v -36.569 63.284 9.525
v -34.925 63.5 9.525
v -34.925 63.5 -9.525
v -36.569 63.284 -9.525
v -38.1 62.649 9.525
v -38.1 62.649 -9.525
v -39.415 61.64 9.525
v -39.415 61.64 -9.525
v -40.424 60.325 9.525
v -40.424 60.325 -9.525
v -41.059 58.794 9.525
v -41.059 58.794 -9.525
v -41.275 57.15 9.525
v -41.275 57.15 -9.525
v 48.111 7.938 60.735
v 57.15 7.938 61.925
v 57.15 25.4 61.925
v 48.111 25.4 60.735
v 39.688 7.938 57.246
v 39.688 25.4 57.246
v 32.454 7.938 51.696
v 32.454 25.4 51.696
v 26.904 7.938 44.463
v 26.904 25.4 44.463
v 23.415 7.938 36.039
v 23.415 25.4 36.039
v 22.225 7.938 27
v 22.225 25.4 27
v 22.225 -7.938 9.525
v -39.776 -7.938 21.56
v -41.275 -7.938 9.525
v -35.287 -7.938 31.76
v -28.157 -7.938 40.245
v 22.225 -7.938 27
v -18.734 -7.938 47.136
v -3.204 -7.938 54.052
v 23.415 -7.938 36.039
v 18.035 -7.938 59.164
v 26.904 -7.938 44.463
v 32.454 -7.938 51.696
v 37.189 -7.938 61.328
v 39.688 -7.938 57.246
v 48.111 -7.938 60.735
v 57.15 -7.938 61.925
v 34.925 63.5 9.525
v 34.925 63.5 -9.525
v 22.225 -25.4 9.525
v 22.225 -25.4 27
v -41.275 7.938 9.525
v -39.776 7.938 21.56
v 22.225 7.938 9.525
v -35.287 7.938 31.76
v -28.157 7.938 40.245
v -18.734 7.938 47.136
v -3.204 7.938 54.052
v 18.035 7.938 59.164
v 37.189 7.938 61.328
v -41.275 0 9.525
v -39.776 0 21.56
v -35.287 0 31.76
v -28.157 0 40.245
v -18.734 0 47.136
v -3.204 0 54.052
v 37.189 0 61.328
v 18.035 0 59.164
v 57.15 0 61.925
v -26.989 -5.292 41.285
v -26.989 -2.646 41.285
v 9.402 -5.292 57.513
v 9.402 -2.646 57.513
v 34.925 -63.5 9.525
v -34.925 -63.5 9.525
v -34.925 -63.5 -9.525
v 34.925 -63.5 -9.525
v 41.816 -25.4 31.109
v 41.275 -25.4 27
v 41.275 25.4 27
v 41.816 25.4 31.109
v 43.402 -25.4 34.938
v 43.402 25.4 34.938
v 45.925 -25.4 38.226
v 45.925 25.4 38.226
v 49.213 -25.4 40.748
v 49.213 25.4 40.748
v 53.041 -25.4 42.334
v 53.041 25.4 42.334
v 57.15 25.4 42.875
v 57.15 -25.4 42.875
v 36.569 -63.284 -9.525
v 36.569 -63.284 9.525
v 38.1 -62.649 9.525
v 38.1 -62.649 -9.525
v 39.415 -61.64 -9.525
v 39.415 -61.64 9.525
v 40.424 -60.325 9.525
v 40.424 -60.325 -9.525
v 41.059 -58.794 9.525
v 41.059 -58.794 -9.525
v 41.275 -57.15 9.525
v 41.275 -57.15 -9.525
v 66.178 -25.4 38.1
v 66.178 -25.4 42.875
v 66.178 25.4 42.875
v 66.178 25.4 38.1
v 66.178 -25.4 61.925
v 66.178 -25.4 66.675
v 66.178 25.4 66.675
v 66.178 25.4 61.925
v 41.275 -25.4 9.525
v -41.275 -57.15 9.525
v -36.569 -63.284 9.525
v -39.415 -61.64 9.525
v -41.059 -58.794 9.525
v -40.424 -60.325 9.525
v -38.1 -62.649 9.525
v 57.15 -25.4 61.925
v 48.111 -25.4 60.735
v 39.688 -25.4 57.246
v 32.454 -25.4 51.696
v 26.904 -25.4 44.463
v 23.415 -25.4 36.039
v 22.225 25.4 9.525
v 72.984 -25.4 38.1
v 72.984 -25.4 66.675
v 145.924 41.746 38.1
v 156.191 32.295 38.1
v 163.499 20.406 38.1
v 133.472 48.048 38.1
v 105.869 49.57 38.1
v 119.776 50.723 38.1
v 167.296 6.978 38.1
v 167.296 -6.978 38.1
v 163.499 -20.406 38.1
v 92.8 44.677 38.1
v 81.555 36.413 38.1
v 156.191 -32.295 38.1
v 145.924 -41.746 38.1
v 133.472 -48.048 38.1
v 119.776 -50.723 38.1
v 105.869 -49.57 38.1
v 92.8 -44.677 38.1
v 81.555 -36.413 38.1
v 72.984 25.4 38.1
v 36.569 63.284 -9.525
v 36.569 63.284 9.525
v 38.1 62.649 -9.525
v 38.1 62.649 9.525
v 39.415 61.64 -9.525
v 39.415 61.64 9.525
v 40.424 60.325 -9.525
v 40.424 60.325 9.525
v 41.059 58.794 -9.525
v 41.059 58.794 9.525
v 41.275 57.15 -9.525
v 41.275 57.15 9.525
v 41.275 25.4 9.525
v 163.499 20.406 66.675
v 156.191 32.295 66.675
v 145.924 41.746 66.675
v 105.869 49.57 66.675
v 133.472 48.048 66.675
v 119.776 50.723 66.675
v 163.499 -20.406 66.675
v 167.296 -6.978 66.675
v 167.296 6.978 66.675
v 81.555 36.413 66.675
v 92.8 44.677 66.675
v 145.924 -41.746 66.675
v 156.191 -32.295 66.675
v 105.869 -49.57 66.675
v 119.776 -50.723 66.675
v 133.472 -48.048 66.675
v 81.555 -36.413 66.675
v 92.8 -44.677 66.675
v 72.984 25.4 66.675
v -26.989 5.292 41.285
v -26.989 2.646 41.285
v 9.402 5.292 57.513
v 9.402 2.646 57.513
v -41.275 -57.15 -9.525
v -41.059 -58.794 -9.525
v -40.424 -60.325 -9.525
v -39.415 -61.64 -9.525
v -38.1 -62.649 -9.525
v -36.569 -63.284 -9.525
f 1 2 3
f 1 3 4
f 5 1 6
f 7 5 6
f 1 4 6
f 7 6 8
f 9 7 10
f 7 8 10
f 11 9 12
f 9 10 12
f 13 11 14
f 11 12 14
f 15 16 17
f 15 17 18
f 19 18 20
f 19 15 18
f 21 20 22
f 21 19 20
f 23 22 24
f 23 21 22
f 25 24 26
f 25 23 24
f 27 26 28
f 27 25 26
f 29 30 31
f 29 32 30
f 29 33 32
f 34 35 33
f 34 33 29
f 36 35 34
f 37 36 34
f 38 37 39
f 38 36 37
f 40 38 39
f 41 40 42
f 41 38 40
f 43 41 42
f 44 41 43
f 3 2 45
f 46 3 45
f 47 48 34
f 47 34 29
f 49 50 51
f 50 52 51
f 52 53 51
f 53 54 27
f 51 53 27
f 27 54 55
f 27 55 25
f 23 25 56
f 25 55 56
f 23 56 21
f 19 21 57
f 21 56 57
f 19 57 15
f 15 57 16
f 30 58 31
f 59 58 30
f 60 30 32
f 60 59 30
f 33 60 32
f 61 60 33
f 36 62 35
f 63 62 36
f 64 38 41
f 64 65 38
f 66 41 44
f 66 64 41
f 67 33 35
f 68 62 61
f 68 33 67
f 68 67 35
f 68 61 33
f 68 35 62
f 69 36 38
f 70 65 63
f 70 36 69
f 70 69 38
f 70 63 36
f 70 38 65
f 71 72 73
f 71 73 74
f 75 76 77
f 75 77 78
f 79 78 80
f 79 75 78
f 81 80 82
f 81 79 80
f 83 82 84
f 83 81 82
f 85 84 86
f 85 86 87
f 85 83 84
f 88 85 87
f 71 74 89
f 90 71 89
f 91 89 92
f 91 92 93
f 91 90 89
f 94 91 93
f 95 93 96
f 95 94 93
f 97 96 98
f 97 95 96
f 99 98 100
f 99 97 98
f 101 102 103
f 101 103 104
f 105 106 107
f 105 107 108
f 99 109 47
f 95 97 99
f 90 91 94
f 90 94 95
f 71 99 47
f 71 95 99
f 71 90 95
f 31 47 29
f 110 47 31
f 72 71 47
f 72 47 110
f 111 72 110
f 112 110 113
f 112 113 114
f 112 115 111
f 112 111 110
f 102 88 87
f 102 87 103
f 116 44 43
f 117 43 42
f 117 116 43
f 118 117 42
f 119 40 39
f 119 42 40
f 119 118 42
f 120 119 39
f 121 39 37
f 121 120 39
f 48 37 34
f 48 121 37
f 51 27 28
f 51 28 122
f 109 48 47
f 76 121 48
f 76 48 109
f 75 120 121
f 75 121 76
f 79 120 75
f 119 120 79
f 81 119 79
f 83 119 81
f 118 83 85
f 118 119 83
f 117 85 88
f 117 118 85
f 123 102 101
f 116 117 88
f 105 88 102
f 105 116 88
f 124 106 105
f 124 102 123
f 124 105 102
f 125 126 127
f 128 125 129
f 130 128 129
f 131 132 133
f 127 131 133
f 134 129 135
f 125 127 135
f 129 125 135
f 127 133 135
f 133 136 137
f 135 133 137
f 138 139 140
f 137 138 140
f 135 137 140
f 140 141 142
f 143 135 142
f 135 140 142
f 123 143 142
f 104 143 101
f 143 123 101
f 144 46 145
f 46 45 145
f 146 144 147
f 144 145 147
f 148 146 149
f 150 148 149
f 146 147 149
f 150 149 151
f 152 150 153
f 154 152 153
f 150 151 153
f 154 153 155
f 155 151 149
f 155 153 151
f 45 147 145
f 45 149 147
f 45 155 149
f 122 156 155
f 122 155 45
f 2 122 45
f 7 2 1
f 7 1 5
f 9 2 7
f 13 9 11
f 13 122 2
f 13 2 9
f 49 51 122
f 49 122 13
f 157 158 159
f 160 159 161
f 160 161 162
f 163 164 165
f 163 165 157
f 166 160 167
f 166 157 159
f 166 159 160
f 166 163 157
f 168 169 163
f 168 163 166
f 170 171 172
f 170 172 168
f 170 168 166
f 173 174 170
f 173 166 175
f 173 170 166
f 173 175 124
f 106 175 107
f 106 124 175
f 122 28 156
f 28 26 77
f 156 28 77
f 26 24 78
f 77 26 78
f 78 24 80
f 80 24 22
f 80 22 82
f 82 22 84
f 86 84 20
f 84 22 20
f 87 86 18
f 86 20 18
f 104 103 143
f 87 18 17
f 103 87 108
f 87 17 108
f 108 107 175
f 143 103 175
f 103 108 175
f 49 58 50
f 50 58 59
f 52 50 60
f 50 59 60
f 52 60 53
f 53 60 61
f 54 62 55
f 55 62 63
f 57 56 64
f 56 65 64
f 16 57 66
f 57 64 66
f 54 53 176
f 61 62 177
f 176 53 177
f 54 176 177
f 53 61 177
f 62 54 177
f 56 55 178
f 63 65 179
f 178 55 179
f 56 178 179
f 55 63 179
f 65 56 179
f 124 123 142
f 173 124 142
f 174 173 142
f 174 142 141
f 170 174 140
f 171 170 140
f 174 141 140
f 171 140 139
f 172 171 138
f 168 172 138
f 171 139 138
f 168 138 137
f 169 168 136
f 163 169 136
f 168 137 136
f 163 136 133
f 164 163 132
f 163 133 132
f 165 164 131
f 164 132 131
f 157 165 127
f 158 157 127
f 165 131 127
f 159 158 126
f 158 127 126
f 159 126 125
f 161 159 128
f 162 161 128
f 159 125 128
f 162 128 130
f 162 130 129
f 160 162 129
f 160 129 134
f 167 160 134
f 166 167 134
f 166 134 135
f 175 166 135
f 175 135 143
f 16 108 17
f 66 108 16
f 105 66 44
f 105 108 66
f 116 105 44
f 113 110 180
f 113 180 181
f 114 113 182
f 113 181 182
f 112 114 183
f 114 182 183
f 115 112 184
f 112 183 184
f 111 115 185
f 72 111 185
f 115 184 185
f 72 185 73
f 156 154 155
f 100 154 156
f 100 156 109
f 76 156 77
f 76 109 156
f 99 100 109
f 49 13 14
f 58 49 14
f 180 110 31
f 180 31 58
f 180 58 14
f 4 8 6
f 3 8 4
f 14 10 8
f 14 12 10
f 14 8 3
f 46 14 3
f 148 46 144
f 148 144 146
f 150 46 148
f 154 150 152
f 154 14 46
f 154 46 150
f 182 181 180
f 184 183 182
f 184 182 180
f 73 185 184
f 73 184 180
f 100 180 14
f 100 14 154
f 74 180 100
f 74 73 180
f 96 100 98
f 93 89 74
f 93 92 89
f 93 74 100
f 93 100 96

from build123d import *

# Parameters (mm, degrees)
F1_DEPTH = 63.5
F2_DEPTH = 25.4
F3_DEPTH = 7.9375
F5_R     = 6.35


with BuildPart() as f1:
    # F0 (on Front) → F1 (new body, symmetric)
    with BuildSketch(Plane.XZ):
        Polygon((41.275, -9.525), (41.275, 9.525), (22.225, 9.525), (-41.275, 9.525), (-41.275, -9.525), align=None)
    extrude(amount=F1_DEPTH, both=True)

    # F0 (on Front) → F2 (join, symmetric)
    with BuildSketch(Plane.XZ):
        with BuildLine():
            Line((22.225, 9.525), (41.275, 9.525))
            Line((41.275, 9.525), (41.275, 27.0002))
            ThreePointArc((41.275, 27.0002), (45.92468, 38.22552), (57.15, 42.8752))
            Line((57.15, 42.8752), (66.177751, 42.8752))
            Line((66.177751, 42.8752), (66.177751, 61.9252))
            Line((66.177751, 61.9252), (57.15, 61.9252))
            ThreePointArc((57.15, 61.9252), (32.454296, 51.695904), (22.225, 27.0002))
            Line((22.225, 27.0002), (22.225, 9.525))
        make_face()
        Polygon((66.177751, 61.9252), (66.177751, 42.8752), (66.177751, 38.1), (116.977751, 38.1), (116.977751, 66.675), (66.177751, 66.675), align=None)
    extrude(amount=F2_DEPTH, both=True)

    # F0 (on Front) → F3 (join, symmetric)
    with BuildSketch(Plane.XZ):
        with BuildLine():
            Line((-41.275, 9.525), (22.225, 9.525))
            Line((22.225, 9.525), (22.225, 27.0002))
            ThreePointArc((22.225, 27.0002), (32.454296, 51.695904), (57.15, 61.9252))
            add(Edge.make_bspline(
                [(-41.275, 9.525), (-41.624442, 50.289135), (7.305516, 62.18183), (57.15, 61.9252)],
                knots=[0, 0, 0, 0, 111.504536, 111.504536, 111.504536, 111.504536], degree=3))
        make_face()
    extrude(amount=F3_DEPTH, both=True)

    # F0 (on Front) → F4 (revolve)
    with BuildSketch(Plane.XZ):
        Polygon((66.177751, 61.9252), (66.177751, 42.8752), (66.177751, 38.1), (116.977751, 38.1), (116.977751, 66.675), (66.177751, 66.675), align=None)
    revolve(axis=Axis((116.977751, 0, 52.3875), (0, 0, 1)))

    # F5
    f5_edges = [f1.edges().sort_by_distance(p)[0] for p in [
        (41.275, 63.5, 0),
        (41.275, -63.5, 0),
        (-41.275, -63.5, 0),
        (-41.275, 63.5, 0),
    ]]
    fillet(f5_edges, radius=F5_R)


solid = f1.part
